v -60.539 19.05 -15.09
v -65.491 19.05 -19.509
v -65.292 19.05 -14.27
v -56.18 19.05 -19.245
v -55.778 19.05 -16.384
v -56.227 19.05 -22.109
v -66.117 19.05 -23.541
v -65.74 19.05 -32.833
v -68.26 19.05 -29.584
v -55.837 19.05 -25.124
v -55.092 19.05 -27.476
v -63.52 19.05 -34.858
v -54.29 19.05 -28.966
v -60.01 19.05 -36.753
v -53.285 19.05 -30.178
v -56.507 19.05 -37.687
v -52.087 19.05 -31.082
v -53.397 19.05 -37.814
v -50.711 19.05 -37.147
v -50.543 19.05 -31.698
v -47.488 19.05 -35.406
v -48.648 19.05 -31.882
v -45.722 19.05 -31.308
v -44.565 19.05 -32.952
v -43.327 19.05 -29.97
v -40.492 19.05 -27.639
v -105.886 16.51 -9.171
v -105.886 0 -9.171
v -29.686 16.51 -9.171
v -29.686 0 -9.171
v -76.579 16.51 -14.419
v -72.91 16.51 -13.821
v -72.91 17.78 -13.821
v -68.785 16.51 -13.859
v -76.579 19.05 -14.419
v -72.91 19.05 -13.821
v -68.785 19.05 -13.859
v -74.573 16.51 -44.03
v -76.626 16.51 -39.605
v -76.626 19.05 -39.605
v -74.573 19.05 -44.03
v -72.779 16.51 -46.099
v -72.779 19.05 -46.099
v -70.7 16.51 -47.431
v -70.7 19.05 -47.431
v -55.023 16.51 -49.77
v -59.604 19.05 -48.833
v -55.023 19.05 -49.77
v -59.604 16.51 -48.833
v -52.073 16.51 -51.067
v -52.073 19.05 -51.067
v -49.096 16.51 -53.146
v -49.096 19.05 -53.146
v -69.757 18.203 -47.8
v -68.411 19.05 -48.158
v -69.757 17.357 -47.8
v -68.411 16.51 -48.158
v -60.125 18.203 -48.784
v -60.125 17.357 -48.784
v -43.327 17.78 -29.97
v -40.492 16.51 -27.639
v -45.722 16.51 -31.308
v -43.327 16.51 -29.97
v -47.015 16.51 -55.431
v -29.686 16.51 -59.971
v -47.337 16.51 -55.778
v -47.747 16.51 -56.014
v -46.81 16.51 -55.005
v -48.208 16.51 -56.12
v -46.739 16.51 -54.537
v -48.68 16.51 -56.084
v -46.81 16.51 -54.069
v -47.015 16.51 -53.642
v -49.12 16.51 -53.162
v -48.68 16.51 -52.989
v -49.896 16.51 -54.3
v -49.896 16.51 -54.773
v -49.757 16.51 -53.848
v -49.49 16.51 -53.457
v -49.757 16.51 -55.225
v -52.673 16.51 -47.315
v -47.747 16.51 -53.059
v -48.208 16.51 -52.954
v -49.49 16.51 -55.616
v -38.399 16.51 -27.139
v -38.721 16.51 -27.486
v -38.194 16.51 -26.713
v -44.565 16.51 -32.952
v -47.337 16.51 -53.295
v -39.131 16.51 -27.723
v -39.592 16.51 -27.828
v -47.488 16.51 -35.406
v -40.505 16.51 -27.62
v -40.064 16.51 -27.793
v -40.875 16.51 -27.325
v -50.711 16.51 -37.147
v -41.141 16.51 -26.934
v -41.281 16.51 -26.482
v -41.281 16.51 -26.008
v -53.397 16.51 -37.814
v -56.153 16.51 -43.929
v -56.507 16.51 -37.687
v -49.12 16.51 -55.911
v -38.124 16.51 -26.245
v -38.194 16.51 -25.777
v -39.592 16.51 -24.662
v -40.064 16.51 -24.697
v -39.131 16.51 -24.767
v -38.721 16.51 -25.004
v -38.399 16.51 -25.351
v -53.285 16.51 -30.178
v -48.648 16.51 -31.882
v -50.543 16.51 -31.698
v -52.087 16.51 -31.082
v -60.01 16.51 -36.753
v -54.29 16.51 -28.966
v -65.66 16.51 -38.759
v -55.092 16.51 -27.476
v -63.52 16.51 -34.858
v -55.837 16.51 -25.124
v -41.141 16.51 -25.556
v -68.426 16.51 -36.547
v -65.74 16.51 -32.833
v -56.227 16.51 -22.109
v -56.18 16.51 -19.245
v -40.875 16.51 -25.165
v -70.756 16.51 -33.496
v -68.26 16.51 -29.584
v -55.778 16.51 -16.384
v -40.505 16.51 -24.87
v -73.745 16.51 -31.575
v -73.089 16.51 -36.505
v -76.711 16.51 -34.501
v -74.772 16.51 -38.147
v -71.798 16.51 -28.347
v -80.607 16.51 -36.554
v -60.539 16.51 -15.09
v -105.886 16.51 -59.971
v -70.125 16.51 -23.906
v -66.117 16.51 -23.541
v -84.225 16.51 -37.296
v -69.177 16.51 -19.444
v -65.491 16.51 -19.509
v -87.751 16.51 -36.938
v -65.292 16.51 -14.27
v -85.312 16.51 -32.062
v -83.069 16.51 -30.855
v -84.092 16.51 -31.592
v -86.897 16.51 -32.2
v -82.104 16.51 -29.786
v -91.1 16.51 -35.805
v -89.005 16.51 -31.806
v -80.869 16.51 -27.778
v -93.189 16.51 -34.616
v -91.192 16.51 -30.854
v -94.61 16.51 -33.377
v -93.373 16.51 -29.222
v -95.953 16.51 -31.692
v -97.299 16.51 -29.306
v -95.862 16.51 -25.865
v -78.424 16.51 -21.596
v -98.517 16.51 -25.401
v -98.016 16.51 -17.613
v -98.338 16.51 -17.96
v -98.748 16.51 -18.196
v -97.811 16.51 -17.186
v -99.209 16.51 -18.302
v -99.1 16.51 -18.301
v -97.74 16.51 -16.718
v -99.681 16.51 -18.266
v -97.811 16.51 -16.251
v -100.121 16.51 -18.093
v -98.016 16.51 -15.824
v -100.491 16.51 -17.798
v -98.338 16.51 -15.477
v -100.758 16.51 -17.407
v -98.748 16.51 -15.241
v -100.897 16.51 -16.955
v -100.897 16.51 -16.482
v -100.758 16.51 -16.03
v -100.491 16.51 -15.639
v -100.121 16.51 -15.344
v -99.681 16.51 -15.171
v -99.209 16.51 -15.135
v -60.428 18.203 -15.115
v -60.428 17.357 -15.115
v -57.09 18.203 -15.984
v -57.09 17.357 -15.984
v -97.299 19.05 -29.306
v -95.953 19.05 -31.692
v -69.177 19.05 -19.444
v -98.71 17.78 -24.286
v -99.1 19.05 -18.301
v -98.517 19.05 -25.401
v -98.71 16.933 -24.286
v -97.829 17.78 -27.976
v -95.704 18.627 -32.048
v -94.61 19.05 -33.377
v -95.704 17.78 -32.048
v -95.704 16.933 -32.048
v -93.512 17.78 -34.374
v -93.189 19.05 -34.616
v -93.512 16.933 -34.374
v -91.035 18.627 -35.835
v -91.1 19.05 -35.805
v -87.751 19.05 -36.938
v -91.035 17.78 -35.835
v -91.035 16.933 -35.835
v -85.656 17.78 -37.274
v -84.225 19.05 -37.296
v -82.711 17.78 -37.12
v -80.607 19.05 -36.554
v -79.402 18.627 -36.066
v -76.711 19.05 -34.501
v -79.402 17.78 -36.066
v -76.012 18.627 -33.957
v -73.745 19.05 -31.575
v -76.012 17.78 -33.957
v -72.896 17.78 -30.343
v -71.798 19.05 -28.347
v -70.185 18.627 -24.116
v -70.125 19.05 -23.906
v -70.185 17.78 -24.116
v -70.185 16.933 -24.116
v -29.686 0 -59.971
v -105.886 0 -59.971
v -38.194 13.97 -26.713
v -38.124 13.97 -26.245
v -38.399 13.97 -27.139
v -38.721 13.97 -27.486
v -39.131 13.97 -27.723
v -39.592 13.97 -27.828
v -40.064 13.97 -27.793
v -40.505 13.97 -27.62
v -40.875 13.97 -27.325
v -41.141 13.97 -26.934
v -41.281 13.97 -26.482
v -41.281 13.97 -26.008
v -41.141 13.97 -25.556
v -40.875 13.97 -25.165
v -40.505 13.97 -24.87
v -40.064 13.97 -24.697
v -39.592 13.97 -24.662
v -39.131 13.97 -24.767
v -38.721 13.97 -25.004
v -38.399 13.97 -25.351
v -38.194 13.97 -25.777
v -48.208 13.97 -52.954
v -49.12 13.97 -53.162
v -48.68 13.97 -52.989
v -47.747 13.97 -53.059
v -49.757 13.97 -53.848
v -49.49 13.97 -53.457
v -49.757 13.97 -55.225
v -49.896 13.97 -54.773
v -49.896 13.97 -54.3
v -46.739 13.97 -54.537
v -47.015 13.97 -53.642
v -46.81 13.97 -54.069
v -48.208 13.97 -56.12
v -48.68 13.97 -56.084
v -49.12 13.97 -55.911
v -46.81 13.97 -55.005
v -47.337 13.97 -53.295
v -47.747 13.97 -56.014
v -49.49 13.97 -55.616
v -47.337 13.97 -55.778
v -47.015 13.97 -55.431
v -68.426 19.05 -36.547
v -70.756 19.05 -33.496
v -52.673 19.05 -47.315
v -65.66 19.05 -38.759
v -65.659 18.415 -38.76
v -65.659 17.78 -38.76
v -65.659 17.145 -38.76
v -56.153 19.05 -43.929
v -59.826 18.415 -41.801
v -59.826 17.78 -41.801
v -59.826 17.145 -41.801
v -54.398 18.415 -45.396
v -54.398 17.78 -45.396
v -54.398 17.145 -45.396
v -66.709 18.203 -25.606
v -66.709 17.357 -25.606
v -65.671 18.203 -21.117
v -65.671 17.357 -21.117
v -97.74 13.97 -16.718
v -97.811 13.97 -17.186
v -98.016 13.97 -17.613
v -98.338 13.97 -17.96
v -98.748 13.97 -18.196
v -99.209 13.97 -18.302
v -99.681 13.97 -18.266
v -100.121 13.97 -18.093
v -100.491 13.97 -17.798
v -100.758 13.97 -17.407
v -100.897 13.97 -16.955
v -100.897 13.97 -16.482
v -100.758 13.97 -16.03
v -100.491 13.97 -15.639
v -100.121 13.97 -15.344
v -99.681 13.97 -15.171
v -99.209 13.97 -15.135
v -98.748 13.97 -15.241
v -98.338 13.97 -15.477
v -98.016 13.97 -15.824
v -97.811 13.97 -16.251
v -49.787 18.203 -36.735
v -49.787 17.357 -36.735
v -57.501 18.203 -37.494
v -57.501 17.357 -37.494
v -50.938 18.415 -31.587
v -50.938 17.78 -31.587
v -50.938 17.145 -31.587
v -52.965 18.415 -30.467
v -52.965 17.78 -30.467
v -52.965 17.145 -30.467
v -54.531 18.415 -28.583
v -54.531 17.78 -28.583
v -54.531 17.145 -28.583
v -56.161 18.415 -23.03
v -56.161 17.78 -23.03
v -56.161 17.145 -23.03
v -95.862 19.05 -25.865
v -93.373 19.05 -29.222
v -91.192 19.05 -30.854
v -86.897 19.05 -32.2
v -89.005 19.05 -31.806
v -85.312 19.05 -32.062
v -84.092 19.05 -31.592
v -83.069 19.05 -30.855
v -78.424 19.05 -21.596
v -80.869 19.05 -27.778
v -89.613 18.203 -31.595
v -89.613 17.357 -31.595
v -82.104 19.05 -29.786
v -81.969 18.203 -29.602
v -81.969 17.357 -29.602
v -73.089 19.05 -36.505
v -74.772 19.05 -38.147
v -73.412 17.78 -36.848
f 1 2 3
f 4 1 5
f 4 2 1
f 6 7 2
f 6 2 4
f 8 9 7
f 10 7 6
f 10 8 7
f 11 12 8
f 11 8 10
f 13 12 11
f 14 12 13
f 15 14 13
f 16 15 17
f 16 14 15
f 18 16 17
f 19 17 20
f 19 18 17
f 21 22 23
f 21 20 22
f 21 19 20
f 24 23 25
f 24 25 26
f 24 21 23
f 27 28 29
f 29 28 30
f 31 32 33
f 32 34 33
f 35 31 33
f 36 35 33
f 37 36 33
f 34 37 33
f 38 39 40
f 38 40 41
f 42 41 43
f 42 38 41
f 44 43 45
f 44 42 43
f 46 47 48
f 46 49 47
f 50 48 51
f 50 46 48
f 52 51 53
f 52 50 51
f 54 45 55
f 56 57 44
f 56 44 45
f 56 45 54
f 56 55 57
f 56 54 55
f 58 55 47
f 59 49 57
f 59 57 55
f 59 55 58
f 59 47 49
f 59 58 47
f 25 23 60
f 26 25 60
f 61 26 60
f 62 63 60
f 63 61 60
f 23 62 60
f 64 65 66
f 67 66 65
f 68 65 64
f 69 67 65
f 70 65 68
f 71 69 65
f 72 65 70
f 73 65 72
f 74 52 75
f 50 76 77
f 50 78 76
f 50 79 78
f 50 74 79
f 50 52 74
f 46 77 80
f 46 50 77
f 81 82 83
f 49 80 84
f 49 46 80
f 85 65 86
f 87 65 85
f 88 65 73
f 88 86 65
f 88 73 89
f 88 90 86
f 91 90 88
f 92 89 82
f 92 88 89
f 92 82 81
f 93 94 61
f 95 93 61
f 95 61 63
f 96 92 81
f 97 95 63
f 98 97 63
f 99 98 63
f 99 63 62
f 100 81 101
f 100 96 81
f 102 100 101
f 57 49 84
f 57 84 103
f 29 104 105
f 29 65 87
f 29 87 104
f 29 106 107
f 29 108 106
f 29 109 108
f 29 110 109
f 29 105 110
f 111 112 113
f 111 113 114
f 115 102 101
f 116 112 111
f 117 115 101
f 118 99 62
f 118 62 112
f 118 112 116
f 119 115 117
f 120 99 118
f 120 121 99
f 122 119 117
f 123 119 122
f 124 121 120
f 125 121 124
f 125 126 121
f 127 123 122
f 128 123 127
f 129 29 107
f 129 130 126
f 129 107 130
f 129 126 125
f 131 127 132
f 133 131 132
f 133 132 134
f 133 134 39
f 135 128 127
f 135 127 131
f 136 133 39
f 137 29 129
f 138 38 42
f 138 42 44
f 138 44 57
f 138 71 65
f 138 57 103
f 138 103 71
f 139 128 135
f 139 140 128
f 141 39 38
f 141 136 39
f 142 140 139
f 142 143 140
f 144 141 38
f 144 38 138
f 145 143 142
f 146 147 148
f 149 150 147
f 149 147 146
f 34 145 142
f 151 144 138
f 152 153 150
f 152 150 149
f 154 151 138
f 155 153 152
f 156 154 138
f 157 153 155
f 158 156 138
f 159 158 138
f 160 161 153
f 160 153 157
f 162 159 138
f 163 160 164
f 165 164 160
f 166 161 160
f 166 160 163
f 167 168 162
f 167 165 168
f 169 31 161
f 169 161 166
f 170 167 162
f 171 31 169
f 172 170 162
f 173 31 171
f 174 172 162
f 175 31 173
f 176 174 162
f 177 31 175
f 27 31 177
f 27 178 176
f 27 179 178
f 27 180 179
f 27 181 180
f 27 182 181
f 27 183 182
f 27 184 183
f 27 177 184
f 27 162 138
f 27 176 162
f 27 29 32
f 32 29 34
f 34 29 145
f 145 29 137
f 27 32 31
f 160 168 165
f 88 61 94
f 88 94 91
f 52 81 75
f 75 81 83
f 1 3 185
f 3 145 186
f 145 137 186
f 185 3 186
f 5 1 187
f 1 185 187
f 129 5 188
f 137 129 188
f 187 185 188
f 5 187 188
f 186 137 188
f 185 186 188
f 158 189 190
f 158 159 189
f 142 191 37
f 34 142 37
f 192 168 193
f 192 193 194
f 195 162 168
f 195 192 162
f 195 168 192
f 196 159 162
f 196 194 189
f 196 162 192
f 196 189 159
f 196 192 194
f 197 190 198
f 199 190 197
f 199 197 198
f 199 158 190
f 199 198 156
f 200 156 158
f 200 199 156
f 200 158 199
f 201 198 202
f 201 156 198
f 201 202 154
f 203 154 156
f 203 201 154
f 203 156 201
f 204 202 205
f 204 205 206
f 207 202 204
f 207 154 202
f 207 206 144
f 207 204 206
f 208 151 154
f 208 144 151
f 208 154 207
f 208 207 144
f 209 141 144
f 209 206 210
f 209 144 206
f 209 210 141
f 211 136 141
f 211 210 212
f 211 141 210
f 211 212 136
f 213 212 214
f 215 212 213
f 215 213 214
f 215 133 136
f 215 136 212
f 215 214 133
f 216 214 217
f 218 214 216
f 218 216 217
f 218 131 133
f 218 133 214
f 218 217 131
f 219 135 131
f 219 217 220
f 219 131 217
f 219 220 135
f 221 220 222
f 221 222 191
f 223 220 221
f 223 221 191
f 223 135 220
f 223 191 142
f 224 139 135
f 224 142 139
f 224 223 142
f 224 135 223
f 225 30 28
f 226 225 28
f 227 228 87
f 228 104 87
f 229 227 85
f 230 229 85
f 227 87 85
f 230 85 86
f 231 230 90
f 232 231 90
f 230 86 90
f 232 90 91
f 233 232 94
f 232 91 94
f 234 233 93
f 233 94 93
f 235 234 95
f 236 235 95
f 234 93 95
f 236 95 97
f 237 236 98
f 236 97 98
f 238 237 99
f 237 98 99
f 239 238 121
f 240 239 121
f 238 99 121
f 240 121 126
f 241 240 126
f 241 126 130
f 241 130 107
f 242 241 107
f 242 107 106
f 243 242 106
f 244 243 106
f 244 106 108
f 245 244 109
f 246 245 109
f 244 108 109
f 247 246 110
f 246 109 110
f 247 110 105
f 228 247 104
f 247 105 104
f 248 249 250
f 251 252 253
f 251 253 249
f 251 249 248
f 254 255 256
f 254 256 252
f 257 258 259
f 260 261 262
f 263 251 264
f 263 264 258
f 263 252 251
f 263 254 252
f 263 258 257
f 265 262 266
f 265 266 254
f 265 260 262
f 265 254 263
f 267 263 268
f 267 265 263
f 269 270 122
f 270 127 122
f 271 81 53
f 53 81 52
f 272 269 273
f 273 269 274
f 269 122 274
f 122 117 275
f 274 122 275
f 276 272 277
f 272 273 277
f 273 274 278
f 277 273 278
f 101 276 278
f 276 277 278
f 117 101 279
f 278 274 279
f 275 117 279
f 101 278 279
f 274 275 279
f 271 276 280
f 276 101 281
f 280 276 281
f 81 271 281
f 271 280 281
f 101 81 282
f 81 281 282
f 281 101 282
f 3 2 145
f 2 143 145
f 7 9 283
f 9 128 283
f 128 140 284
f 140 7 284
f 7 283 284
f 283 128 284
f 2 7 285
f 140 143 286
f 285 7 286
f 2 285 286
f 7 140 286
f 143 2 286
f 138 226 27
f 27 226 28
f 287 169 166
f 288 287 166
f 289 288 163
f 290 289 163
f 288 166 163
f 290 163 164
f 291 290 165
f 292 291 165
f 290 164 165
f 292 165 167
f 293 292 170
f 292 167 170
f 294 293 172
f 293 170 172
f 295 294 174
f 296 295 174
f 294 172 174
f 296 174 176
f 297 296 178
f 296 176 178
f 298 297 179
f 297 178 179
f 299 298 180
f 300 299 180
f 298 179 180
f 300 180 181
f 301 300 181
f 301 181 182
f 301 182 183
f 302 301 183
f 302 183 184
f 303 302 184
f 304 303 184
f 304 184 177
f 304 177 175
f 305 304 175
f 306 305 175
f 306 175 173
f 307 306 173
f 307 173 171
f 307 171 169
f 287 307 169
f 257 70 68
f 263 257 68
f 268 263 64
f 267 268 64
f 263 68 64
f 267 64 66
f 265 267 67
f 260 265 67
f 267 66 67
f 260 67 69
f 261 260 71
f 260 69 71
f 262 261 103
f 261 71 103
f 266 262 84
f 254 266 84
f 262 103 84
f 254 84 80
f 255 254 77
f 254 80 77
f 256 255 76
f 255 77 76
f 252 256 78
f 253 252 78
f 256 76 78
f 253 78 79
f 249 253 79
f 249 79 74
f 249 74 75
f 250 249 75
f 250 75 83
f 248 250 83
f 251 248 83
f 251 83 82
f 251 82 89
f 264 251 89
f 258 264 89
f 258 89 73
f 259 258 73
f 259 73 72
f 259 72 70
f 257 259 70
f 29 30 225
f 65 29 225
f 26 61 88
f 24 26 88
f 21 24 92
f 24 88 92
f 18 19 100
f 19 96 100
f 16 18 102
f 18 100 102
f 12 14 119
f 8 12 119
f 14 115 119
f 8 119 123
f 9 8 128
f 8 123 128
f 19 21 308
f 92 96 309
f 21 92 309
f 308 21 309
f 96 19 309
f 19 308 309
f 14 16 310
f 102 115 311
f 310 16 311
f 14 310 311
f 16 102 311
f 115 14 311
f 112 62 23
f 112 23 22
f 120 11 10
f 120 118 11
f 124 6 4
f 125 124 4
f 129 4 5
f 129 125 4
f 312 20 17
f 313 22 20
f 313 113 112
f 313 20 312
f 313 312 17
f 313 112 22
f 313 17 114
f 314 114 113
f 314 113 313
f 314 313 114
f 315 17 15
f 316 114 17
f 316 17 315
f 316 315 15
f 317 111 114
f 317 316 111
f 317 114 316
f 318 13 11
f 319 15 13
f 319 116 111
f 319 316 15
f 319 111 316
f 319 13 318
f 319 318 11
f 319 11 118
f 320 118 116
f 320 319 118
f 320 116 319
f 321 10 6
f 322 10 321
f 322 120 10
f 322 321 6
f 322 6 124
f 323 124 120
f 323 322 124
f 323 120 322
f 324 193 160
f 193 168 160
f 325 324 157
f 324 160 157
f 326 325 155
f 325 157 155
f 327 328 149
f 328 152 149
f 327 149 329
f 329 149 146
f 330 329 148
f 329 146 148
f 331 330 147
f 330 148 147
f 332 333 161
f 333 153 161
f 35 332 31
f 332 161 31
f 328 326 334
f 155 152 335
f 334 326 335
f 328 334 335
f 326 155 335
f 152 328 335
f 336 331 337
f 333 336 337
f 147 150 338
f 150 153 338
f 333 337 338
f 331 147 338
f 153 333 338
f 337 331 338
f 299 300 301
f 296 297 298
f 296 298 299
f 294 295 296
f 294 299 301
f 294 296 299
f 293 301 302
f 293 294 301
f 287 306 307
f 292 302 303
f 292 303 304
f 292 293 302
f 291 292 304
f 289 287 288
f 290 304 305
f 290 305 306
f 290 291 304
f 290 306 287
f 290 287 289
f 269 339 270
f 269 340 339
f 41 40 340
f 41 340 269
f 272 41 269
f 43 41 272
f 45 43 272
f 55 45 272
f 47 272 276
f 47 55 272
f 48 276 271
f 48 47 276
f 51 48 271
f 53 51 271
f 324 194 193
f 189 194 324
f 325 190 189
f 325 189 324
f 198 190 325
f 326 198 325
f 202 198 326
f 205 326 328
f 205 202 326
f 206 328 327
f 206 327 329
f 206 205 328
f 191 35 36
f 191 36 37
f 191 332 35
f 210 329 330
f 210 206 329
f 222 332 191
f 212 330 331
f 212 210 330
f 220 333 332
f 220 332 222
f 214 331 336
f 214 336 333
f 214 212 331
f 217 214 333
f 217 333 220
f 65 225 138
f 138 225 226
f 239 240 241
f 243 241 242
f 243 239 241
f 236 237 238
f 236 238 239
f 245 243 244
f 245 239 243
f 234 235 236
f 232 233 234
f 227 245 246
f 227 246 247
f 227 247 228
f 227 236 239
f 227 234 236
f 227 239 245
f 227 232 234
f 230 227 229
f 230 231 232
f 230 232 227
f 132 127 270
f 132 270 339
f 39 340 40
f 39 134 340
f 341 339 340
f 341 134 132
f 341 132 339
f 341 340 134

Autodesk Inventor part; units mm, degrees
ref_plane "YZ Plane" through (0, 0, 0) normal (1, 0, 0) x (0, 1, 0)
ref_plane "XZ Plane" through (0, 0, 0) normal (0, 1, 0) x (-1, 0, 0)
ref_plane "XY Plane" through (0, 0, 0) normal (0, 0, 1) x (1, 0, 0)
sketch "Sketch1" plane through (0, 0, 0) normal (0, 1, 0) x (-1, 0, 0)
  line L0 (105.8864, -9.1713) -> (29.6864, -9.1713)
  line L1 (29.6864, -9.1713) -> (29.6864, -59.9713)
  line L2 (29.6864, -59.9713) -> (105.8864, -59.9713)
  line L3 (105.8864, -59.9713) -> (105.8864, -9.1713)
  point P0 (0, 0)
  dimension "d0" = 76.2
  dimension "d1" = 50.8
extrude "Extrusion1" add sketch "Sketch1" along normal blind 16.51
sketch "Sketch2" plane through (0, 16.51, 0) normal (0, 1, 0) x (1, 0, 0)
  line L0 (-99.1001, 18.3012) -> (-96.0417, 26.9953) construction
  line L1 (-96.0417, 26.9953) -> (-92.1887, 31.3423) construction
  line L2 (-92.1887, 31.3423) -> (-84.285, 34.3061) construction
  line L3 (-84.285, 34.3061) -> (-80.6296, 29.3664) construction
  line L4 (-80.6296, 29.3664) -> (-77.2705, 18.3012) construction
  line L5 (-77.2705, 18.3012) -> (-76.579, 14.4191) construction
  spline S0 degree 4 poles (-99.1001, 18.3012) (-96.0417, 26.9953) (-92.1887, 31.3423) (-84.285, 34.3061) (-80.6296, 29.3664) (-77.2705, 18.3012) (-76.579, 14.4191) knots 1 1 1 1 1 2 3 4 4 4 4 4
  line L6 (-99.1001, 18.3012) -> (-99.1001, 25.8499) construction
  line L7 (-99.1001, 25.8499) -> (-96.5674, 31.3423) construction
  line L8 (-96.5674, 31.3423) -> (-93.9607, 34.9573) construction
  line L9 (-93.9607, 34.9573) -> (-88.2369, 37.0386) construction
  line L10 (-88.2369, 37.0386) -> (-83.2313, 37.9368) construction
  line L11 (-83.2313, 37.9368) -> (-75.6293, 34.8836) construction
  line L12 (-75.6293, 34.8836) -> (-71.3593, 29.3664) construction
  line L13 (-71.3593, 29.3664) -> (-68.785, 20.2226) construction
  line L14 (-68.785, 20.2226) -> (-68.785, 13.8588) construction
  spline S1 degree 4 poles (-99.1001, 18.3012) (-99.1001, 25.8499) (-96.5674, 31.3423) (-93.9607, 34.9573) (-88.2369, 37.0386) (-83.2313, 37.9368) (-75.6293, 34.8836) (-71.3593, 29.3664) (-68.785, 20.2226) (-68.785, 13.8588) knots 1 1 1 1 1 2 3 4 5 6 7 7 7 7 7
  line L15 (-68.2598, 29.584) -> (-66.503, 25.2471) construction
  line L16 (-66.503, 25.2471) -> (-65.2915, 22.9111) construction
  line L17 (-65.2915, 22.9111) -> (-65.2915, 14.27) construction
  spline S2 degree 3 poles (-68.2598, 29.584) (-66.503, 25.2471) (-65.2915, 22.9111) (-65.2915, 14.27) knots 1 1 1 1 2 2 2 2
  spline S3 degree 2 poles (-70.7555, 33.4961) (-73.1331, 37.1458) (-76.6265, 39.605) knots 0 0 0 1 1 1
  line L18 (-76.6265, 39.605) -> (-71.5951, 54.9343) construction
  line L19 (-71.5951, 54.9343) -> (-60.3667, 43.5663) construction
  line L20 (-60.3667, 43.5663) -> (-49.0964, 53.1455) construction
  spline S4 degree 3 poles (-76.6265, 39.605) (-71.5951, 54.9343) (-60.3667, 43.5663) (-49.0964, 53.1455) knots 1 1 1 1 2 2 2 2
  line L21 (-65.2915, 14.27) -> (-59.8318, 14.9374) construction
  line L22 (-59.8318, 14.9374) -> (-55.9104, 16.3841) construction
  line L23 (-55.9104, 16.3841) -> (-55.7779, 16.3841) construction
  spline S5 degree 3 poles (-65.2915, 14.27) (-59.8318, 14.9374) (-55.9104, 16.3841) (-55.7779, 16.3841) knots 1 1 1 1 2 2 2 2
  line L24 (-57.1115, 22.9111) -> (-55.7779, 16.3841) construction
  spline S6 degree 4 poles (-45.7217, 31.3084) (-51.5634, 33.293) (-56.0482, 30.8036) (-57.1115, 22.9111) (-55.7779, 16.3841) knots 1.168057 1.168057 1.168057 1.168057 1.168057 2 2 2 2 2
  line L25 (-45.7217, 31.3084) -> (-51.5634, 33.293) construction
  line L26 (-51.5634, 33.293) -> (-56.0482, 30.8036) construction
  line L27 (-56.0482, 30.8036) -> (-57.1115, 22.9111) construction
  line L28 (-45.7217, 31.3084) -> (-43.5479, 30.466) construction
  line L29 (-43.5479, 30.466) -> (-40.4918, 27.639) construction
  spline S7 degree 2 poles (-45.7217, 31.3084) (-43.5479, 30.466) (-40.4918, 27.639) knots 1 1 1 2 2 2
  line L30 (-40.4918, 27.639) -> (-44.1138, 33.293) construction
  line L31 (-44.1138, 33.293) -> (-48.4479, 36.0572) construction
  line L32 (-48.4479, 36.0572) -> (-52.5651, 39.1817) construction
  line L33 (-52.5651, 39.1817) -> (-59.6522, 37.2966) construction
  line L34 (-59.6522, 37.2966) -> (-64.7462, 34.8183) construction
  line L35 (-64.7462, 34.8183) -> (-68.2598, 29.584) construction
  spline S8 degree 4 poles (-40.4918, 27.639) (-44.1138, 33.293) (-48.4479, 36.0572) (-52.5651, 39.1817) (-59.6522, 37.2966) (-64.7462, 34.8183) (-68.2598, 29.584) knots 1 1 1 1 1 2 3 4 4 4 4 4
  spline S9 degree 4 poles (-70.7555, 33.4961) (-66.7607, 40.5932) (-58.5336, 42.023) (-54.7819, 41.9147) (-49.0964, 53.1455) knots 0 0 0 0 0 1 1 1 1 1
  line L36 (-76.579, 14.4191) -> (-73.1385, 13.5025) construction
  line L37 (-73.1385, 13.5025) -> (-68.785, 13.8588) construction
  spline S10 degree 2 poles (-76.579, 14.4191) (-73.1385, 13.5025) (-68.785, 13.8588) knots 1 1 1 2 2 2
  point P0 (0, 0)
  point P1 (-73.4266, 36.8633)
  point P2 (-65.6468, 38.768)
  point P3 (-60.3715, 41.5372)
  point P4 (-55.5489, 44.3879)
sketch "Sketch5" plane through (0, 16.51, 0) normal (0, 1, 0) x (1, 0, 0)
  circle A0 centre (-39.7111, 26.2451) radius 1.5875
  circle A1 centre (-99.3276, 16.7185) radius 1.5875
  circle A2 centre (-48.3267, 54.5366) radius 1.5875
  point P0 (0, 0)
extrude "Extrusion8" add sketch "Sketch2" along normal blind 2.54
extrude "Extrusion9" cut sketch "Sketch5" against normal blind 2.54
properties part number "cimproj"
